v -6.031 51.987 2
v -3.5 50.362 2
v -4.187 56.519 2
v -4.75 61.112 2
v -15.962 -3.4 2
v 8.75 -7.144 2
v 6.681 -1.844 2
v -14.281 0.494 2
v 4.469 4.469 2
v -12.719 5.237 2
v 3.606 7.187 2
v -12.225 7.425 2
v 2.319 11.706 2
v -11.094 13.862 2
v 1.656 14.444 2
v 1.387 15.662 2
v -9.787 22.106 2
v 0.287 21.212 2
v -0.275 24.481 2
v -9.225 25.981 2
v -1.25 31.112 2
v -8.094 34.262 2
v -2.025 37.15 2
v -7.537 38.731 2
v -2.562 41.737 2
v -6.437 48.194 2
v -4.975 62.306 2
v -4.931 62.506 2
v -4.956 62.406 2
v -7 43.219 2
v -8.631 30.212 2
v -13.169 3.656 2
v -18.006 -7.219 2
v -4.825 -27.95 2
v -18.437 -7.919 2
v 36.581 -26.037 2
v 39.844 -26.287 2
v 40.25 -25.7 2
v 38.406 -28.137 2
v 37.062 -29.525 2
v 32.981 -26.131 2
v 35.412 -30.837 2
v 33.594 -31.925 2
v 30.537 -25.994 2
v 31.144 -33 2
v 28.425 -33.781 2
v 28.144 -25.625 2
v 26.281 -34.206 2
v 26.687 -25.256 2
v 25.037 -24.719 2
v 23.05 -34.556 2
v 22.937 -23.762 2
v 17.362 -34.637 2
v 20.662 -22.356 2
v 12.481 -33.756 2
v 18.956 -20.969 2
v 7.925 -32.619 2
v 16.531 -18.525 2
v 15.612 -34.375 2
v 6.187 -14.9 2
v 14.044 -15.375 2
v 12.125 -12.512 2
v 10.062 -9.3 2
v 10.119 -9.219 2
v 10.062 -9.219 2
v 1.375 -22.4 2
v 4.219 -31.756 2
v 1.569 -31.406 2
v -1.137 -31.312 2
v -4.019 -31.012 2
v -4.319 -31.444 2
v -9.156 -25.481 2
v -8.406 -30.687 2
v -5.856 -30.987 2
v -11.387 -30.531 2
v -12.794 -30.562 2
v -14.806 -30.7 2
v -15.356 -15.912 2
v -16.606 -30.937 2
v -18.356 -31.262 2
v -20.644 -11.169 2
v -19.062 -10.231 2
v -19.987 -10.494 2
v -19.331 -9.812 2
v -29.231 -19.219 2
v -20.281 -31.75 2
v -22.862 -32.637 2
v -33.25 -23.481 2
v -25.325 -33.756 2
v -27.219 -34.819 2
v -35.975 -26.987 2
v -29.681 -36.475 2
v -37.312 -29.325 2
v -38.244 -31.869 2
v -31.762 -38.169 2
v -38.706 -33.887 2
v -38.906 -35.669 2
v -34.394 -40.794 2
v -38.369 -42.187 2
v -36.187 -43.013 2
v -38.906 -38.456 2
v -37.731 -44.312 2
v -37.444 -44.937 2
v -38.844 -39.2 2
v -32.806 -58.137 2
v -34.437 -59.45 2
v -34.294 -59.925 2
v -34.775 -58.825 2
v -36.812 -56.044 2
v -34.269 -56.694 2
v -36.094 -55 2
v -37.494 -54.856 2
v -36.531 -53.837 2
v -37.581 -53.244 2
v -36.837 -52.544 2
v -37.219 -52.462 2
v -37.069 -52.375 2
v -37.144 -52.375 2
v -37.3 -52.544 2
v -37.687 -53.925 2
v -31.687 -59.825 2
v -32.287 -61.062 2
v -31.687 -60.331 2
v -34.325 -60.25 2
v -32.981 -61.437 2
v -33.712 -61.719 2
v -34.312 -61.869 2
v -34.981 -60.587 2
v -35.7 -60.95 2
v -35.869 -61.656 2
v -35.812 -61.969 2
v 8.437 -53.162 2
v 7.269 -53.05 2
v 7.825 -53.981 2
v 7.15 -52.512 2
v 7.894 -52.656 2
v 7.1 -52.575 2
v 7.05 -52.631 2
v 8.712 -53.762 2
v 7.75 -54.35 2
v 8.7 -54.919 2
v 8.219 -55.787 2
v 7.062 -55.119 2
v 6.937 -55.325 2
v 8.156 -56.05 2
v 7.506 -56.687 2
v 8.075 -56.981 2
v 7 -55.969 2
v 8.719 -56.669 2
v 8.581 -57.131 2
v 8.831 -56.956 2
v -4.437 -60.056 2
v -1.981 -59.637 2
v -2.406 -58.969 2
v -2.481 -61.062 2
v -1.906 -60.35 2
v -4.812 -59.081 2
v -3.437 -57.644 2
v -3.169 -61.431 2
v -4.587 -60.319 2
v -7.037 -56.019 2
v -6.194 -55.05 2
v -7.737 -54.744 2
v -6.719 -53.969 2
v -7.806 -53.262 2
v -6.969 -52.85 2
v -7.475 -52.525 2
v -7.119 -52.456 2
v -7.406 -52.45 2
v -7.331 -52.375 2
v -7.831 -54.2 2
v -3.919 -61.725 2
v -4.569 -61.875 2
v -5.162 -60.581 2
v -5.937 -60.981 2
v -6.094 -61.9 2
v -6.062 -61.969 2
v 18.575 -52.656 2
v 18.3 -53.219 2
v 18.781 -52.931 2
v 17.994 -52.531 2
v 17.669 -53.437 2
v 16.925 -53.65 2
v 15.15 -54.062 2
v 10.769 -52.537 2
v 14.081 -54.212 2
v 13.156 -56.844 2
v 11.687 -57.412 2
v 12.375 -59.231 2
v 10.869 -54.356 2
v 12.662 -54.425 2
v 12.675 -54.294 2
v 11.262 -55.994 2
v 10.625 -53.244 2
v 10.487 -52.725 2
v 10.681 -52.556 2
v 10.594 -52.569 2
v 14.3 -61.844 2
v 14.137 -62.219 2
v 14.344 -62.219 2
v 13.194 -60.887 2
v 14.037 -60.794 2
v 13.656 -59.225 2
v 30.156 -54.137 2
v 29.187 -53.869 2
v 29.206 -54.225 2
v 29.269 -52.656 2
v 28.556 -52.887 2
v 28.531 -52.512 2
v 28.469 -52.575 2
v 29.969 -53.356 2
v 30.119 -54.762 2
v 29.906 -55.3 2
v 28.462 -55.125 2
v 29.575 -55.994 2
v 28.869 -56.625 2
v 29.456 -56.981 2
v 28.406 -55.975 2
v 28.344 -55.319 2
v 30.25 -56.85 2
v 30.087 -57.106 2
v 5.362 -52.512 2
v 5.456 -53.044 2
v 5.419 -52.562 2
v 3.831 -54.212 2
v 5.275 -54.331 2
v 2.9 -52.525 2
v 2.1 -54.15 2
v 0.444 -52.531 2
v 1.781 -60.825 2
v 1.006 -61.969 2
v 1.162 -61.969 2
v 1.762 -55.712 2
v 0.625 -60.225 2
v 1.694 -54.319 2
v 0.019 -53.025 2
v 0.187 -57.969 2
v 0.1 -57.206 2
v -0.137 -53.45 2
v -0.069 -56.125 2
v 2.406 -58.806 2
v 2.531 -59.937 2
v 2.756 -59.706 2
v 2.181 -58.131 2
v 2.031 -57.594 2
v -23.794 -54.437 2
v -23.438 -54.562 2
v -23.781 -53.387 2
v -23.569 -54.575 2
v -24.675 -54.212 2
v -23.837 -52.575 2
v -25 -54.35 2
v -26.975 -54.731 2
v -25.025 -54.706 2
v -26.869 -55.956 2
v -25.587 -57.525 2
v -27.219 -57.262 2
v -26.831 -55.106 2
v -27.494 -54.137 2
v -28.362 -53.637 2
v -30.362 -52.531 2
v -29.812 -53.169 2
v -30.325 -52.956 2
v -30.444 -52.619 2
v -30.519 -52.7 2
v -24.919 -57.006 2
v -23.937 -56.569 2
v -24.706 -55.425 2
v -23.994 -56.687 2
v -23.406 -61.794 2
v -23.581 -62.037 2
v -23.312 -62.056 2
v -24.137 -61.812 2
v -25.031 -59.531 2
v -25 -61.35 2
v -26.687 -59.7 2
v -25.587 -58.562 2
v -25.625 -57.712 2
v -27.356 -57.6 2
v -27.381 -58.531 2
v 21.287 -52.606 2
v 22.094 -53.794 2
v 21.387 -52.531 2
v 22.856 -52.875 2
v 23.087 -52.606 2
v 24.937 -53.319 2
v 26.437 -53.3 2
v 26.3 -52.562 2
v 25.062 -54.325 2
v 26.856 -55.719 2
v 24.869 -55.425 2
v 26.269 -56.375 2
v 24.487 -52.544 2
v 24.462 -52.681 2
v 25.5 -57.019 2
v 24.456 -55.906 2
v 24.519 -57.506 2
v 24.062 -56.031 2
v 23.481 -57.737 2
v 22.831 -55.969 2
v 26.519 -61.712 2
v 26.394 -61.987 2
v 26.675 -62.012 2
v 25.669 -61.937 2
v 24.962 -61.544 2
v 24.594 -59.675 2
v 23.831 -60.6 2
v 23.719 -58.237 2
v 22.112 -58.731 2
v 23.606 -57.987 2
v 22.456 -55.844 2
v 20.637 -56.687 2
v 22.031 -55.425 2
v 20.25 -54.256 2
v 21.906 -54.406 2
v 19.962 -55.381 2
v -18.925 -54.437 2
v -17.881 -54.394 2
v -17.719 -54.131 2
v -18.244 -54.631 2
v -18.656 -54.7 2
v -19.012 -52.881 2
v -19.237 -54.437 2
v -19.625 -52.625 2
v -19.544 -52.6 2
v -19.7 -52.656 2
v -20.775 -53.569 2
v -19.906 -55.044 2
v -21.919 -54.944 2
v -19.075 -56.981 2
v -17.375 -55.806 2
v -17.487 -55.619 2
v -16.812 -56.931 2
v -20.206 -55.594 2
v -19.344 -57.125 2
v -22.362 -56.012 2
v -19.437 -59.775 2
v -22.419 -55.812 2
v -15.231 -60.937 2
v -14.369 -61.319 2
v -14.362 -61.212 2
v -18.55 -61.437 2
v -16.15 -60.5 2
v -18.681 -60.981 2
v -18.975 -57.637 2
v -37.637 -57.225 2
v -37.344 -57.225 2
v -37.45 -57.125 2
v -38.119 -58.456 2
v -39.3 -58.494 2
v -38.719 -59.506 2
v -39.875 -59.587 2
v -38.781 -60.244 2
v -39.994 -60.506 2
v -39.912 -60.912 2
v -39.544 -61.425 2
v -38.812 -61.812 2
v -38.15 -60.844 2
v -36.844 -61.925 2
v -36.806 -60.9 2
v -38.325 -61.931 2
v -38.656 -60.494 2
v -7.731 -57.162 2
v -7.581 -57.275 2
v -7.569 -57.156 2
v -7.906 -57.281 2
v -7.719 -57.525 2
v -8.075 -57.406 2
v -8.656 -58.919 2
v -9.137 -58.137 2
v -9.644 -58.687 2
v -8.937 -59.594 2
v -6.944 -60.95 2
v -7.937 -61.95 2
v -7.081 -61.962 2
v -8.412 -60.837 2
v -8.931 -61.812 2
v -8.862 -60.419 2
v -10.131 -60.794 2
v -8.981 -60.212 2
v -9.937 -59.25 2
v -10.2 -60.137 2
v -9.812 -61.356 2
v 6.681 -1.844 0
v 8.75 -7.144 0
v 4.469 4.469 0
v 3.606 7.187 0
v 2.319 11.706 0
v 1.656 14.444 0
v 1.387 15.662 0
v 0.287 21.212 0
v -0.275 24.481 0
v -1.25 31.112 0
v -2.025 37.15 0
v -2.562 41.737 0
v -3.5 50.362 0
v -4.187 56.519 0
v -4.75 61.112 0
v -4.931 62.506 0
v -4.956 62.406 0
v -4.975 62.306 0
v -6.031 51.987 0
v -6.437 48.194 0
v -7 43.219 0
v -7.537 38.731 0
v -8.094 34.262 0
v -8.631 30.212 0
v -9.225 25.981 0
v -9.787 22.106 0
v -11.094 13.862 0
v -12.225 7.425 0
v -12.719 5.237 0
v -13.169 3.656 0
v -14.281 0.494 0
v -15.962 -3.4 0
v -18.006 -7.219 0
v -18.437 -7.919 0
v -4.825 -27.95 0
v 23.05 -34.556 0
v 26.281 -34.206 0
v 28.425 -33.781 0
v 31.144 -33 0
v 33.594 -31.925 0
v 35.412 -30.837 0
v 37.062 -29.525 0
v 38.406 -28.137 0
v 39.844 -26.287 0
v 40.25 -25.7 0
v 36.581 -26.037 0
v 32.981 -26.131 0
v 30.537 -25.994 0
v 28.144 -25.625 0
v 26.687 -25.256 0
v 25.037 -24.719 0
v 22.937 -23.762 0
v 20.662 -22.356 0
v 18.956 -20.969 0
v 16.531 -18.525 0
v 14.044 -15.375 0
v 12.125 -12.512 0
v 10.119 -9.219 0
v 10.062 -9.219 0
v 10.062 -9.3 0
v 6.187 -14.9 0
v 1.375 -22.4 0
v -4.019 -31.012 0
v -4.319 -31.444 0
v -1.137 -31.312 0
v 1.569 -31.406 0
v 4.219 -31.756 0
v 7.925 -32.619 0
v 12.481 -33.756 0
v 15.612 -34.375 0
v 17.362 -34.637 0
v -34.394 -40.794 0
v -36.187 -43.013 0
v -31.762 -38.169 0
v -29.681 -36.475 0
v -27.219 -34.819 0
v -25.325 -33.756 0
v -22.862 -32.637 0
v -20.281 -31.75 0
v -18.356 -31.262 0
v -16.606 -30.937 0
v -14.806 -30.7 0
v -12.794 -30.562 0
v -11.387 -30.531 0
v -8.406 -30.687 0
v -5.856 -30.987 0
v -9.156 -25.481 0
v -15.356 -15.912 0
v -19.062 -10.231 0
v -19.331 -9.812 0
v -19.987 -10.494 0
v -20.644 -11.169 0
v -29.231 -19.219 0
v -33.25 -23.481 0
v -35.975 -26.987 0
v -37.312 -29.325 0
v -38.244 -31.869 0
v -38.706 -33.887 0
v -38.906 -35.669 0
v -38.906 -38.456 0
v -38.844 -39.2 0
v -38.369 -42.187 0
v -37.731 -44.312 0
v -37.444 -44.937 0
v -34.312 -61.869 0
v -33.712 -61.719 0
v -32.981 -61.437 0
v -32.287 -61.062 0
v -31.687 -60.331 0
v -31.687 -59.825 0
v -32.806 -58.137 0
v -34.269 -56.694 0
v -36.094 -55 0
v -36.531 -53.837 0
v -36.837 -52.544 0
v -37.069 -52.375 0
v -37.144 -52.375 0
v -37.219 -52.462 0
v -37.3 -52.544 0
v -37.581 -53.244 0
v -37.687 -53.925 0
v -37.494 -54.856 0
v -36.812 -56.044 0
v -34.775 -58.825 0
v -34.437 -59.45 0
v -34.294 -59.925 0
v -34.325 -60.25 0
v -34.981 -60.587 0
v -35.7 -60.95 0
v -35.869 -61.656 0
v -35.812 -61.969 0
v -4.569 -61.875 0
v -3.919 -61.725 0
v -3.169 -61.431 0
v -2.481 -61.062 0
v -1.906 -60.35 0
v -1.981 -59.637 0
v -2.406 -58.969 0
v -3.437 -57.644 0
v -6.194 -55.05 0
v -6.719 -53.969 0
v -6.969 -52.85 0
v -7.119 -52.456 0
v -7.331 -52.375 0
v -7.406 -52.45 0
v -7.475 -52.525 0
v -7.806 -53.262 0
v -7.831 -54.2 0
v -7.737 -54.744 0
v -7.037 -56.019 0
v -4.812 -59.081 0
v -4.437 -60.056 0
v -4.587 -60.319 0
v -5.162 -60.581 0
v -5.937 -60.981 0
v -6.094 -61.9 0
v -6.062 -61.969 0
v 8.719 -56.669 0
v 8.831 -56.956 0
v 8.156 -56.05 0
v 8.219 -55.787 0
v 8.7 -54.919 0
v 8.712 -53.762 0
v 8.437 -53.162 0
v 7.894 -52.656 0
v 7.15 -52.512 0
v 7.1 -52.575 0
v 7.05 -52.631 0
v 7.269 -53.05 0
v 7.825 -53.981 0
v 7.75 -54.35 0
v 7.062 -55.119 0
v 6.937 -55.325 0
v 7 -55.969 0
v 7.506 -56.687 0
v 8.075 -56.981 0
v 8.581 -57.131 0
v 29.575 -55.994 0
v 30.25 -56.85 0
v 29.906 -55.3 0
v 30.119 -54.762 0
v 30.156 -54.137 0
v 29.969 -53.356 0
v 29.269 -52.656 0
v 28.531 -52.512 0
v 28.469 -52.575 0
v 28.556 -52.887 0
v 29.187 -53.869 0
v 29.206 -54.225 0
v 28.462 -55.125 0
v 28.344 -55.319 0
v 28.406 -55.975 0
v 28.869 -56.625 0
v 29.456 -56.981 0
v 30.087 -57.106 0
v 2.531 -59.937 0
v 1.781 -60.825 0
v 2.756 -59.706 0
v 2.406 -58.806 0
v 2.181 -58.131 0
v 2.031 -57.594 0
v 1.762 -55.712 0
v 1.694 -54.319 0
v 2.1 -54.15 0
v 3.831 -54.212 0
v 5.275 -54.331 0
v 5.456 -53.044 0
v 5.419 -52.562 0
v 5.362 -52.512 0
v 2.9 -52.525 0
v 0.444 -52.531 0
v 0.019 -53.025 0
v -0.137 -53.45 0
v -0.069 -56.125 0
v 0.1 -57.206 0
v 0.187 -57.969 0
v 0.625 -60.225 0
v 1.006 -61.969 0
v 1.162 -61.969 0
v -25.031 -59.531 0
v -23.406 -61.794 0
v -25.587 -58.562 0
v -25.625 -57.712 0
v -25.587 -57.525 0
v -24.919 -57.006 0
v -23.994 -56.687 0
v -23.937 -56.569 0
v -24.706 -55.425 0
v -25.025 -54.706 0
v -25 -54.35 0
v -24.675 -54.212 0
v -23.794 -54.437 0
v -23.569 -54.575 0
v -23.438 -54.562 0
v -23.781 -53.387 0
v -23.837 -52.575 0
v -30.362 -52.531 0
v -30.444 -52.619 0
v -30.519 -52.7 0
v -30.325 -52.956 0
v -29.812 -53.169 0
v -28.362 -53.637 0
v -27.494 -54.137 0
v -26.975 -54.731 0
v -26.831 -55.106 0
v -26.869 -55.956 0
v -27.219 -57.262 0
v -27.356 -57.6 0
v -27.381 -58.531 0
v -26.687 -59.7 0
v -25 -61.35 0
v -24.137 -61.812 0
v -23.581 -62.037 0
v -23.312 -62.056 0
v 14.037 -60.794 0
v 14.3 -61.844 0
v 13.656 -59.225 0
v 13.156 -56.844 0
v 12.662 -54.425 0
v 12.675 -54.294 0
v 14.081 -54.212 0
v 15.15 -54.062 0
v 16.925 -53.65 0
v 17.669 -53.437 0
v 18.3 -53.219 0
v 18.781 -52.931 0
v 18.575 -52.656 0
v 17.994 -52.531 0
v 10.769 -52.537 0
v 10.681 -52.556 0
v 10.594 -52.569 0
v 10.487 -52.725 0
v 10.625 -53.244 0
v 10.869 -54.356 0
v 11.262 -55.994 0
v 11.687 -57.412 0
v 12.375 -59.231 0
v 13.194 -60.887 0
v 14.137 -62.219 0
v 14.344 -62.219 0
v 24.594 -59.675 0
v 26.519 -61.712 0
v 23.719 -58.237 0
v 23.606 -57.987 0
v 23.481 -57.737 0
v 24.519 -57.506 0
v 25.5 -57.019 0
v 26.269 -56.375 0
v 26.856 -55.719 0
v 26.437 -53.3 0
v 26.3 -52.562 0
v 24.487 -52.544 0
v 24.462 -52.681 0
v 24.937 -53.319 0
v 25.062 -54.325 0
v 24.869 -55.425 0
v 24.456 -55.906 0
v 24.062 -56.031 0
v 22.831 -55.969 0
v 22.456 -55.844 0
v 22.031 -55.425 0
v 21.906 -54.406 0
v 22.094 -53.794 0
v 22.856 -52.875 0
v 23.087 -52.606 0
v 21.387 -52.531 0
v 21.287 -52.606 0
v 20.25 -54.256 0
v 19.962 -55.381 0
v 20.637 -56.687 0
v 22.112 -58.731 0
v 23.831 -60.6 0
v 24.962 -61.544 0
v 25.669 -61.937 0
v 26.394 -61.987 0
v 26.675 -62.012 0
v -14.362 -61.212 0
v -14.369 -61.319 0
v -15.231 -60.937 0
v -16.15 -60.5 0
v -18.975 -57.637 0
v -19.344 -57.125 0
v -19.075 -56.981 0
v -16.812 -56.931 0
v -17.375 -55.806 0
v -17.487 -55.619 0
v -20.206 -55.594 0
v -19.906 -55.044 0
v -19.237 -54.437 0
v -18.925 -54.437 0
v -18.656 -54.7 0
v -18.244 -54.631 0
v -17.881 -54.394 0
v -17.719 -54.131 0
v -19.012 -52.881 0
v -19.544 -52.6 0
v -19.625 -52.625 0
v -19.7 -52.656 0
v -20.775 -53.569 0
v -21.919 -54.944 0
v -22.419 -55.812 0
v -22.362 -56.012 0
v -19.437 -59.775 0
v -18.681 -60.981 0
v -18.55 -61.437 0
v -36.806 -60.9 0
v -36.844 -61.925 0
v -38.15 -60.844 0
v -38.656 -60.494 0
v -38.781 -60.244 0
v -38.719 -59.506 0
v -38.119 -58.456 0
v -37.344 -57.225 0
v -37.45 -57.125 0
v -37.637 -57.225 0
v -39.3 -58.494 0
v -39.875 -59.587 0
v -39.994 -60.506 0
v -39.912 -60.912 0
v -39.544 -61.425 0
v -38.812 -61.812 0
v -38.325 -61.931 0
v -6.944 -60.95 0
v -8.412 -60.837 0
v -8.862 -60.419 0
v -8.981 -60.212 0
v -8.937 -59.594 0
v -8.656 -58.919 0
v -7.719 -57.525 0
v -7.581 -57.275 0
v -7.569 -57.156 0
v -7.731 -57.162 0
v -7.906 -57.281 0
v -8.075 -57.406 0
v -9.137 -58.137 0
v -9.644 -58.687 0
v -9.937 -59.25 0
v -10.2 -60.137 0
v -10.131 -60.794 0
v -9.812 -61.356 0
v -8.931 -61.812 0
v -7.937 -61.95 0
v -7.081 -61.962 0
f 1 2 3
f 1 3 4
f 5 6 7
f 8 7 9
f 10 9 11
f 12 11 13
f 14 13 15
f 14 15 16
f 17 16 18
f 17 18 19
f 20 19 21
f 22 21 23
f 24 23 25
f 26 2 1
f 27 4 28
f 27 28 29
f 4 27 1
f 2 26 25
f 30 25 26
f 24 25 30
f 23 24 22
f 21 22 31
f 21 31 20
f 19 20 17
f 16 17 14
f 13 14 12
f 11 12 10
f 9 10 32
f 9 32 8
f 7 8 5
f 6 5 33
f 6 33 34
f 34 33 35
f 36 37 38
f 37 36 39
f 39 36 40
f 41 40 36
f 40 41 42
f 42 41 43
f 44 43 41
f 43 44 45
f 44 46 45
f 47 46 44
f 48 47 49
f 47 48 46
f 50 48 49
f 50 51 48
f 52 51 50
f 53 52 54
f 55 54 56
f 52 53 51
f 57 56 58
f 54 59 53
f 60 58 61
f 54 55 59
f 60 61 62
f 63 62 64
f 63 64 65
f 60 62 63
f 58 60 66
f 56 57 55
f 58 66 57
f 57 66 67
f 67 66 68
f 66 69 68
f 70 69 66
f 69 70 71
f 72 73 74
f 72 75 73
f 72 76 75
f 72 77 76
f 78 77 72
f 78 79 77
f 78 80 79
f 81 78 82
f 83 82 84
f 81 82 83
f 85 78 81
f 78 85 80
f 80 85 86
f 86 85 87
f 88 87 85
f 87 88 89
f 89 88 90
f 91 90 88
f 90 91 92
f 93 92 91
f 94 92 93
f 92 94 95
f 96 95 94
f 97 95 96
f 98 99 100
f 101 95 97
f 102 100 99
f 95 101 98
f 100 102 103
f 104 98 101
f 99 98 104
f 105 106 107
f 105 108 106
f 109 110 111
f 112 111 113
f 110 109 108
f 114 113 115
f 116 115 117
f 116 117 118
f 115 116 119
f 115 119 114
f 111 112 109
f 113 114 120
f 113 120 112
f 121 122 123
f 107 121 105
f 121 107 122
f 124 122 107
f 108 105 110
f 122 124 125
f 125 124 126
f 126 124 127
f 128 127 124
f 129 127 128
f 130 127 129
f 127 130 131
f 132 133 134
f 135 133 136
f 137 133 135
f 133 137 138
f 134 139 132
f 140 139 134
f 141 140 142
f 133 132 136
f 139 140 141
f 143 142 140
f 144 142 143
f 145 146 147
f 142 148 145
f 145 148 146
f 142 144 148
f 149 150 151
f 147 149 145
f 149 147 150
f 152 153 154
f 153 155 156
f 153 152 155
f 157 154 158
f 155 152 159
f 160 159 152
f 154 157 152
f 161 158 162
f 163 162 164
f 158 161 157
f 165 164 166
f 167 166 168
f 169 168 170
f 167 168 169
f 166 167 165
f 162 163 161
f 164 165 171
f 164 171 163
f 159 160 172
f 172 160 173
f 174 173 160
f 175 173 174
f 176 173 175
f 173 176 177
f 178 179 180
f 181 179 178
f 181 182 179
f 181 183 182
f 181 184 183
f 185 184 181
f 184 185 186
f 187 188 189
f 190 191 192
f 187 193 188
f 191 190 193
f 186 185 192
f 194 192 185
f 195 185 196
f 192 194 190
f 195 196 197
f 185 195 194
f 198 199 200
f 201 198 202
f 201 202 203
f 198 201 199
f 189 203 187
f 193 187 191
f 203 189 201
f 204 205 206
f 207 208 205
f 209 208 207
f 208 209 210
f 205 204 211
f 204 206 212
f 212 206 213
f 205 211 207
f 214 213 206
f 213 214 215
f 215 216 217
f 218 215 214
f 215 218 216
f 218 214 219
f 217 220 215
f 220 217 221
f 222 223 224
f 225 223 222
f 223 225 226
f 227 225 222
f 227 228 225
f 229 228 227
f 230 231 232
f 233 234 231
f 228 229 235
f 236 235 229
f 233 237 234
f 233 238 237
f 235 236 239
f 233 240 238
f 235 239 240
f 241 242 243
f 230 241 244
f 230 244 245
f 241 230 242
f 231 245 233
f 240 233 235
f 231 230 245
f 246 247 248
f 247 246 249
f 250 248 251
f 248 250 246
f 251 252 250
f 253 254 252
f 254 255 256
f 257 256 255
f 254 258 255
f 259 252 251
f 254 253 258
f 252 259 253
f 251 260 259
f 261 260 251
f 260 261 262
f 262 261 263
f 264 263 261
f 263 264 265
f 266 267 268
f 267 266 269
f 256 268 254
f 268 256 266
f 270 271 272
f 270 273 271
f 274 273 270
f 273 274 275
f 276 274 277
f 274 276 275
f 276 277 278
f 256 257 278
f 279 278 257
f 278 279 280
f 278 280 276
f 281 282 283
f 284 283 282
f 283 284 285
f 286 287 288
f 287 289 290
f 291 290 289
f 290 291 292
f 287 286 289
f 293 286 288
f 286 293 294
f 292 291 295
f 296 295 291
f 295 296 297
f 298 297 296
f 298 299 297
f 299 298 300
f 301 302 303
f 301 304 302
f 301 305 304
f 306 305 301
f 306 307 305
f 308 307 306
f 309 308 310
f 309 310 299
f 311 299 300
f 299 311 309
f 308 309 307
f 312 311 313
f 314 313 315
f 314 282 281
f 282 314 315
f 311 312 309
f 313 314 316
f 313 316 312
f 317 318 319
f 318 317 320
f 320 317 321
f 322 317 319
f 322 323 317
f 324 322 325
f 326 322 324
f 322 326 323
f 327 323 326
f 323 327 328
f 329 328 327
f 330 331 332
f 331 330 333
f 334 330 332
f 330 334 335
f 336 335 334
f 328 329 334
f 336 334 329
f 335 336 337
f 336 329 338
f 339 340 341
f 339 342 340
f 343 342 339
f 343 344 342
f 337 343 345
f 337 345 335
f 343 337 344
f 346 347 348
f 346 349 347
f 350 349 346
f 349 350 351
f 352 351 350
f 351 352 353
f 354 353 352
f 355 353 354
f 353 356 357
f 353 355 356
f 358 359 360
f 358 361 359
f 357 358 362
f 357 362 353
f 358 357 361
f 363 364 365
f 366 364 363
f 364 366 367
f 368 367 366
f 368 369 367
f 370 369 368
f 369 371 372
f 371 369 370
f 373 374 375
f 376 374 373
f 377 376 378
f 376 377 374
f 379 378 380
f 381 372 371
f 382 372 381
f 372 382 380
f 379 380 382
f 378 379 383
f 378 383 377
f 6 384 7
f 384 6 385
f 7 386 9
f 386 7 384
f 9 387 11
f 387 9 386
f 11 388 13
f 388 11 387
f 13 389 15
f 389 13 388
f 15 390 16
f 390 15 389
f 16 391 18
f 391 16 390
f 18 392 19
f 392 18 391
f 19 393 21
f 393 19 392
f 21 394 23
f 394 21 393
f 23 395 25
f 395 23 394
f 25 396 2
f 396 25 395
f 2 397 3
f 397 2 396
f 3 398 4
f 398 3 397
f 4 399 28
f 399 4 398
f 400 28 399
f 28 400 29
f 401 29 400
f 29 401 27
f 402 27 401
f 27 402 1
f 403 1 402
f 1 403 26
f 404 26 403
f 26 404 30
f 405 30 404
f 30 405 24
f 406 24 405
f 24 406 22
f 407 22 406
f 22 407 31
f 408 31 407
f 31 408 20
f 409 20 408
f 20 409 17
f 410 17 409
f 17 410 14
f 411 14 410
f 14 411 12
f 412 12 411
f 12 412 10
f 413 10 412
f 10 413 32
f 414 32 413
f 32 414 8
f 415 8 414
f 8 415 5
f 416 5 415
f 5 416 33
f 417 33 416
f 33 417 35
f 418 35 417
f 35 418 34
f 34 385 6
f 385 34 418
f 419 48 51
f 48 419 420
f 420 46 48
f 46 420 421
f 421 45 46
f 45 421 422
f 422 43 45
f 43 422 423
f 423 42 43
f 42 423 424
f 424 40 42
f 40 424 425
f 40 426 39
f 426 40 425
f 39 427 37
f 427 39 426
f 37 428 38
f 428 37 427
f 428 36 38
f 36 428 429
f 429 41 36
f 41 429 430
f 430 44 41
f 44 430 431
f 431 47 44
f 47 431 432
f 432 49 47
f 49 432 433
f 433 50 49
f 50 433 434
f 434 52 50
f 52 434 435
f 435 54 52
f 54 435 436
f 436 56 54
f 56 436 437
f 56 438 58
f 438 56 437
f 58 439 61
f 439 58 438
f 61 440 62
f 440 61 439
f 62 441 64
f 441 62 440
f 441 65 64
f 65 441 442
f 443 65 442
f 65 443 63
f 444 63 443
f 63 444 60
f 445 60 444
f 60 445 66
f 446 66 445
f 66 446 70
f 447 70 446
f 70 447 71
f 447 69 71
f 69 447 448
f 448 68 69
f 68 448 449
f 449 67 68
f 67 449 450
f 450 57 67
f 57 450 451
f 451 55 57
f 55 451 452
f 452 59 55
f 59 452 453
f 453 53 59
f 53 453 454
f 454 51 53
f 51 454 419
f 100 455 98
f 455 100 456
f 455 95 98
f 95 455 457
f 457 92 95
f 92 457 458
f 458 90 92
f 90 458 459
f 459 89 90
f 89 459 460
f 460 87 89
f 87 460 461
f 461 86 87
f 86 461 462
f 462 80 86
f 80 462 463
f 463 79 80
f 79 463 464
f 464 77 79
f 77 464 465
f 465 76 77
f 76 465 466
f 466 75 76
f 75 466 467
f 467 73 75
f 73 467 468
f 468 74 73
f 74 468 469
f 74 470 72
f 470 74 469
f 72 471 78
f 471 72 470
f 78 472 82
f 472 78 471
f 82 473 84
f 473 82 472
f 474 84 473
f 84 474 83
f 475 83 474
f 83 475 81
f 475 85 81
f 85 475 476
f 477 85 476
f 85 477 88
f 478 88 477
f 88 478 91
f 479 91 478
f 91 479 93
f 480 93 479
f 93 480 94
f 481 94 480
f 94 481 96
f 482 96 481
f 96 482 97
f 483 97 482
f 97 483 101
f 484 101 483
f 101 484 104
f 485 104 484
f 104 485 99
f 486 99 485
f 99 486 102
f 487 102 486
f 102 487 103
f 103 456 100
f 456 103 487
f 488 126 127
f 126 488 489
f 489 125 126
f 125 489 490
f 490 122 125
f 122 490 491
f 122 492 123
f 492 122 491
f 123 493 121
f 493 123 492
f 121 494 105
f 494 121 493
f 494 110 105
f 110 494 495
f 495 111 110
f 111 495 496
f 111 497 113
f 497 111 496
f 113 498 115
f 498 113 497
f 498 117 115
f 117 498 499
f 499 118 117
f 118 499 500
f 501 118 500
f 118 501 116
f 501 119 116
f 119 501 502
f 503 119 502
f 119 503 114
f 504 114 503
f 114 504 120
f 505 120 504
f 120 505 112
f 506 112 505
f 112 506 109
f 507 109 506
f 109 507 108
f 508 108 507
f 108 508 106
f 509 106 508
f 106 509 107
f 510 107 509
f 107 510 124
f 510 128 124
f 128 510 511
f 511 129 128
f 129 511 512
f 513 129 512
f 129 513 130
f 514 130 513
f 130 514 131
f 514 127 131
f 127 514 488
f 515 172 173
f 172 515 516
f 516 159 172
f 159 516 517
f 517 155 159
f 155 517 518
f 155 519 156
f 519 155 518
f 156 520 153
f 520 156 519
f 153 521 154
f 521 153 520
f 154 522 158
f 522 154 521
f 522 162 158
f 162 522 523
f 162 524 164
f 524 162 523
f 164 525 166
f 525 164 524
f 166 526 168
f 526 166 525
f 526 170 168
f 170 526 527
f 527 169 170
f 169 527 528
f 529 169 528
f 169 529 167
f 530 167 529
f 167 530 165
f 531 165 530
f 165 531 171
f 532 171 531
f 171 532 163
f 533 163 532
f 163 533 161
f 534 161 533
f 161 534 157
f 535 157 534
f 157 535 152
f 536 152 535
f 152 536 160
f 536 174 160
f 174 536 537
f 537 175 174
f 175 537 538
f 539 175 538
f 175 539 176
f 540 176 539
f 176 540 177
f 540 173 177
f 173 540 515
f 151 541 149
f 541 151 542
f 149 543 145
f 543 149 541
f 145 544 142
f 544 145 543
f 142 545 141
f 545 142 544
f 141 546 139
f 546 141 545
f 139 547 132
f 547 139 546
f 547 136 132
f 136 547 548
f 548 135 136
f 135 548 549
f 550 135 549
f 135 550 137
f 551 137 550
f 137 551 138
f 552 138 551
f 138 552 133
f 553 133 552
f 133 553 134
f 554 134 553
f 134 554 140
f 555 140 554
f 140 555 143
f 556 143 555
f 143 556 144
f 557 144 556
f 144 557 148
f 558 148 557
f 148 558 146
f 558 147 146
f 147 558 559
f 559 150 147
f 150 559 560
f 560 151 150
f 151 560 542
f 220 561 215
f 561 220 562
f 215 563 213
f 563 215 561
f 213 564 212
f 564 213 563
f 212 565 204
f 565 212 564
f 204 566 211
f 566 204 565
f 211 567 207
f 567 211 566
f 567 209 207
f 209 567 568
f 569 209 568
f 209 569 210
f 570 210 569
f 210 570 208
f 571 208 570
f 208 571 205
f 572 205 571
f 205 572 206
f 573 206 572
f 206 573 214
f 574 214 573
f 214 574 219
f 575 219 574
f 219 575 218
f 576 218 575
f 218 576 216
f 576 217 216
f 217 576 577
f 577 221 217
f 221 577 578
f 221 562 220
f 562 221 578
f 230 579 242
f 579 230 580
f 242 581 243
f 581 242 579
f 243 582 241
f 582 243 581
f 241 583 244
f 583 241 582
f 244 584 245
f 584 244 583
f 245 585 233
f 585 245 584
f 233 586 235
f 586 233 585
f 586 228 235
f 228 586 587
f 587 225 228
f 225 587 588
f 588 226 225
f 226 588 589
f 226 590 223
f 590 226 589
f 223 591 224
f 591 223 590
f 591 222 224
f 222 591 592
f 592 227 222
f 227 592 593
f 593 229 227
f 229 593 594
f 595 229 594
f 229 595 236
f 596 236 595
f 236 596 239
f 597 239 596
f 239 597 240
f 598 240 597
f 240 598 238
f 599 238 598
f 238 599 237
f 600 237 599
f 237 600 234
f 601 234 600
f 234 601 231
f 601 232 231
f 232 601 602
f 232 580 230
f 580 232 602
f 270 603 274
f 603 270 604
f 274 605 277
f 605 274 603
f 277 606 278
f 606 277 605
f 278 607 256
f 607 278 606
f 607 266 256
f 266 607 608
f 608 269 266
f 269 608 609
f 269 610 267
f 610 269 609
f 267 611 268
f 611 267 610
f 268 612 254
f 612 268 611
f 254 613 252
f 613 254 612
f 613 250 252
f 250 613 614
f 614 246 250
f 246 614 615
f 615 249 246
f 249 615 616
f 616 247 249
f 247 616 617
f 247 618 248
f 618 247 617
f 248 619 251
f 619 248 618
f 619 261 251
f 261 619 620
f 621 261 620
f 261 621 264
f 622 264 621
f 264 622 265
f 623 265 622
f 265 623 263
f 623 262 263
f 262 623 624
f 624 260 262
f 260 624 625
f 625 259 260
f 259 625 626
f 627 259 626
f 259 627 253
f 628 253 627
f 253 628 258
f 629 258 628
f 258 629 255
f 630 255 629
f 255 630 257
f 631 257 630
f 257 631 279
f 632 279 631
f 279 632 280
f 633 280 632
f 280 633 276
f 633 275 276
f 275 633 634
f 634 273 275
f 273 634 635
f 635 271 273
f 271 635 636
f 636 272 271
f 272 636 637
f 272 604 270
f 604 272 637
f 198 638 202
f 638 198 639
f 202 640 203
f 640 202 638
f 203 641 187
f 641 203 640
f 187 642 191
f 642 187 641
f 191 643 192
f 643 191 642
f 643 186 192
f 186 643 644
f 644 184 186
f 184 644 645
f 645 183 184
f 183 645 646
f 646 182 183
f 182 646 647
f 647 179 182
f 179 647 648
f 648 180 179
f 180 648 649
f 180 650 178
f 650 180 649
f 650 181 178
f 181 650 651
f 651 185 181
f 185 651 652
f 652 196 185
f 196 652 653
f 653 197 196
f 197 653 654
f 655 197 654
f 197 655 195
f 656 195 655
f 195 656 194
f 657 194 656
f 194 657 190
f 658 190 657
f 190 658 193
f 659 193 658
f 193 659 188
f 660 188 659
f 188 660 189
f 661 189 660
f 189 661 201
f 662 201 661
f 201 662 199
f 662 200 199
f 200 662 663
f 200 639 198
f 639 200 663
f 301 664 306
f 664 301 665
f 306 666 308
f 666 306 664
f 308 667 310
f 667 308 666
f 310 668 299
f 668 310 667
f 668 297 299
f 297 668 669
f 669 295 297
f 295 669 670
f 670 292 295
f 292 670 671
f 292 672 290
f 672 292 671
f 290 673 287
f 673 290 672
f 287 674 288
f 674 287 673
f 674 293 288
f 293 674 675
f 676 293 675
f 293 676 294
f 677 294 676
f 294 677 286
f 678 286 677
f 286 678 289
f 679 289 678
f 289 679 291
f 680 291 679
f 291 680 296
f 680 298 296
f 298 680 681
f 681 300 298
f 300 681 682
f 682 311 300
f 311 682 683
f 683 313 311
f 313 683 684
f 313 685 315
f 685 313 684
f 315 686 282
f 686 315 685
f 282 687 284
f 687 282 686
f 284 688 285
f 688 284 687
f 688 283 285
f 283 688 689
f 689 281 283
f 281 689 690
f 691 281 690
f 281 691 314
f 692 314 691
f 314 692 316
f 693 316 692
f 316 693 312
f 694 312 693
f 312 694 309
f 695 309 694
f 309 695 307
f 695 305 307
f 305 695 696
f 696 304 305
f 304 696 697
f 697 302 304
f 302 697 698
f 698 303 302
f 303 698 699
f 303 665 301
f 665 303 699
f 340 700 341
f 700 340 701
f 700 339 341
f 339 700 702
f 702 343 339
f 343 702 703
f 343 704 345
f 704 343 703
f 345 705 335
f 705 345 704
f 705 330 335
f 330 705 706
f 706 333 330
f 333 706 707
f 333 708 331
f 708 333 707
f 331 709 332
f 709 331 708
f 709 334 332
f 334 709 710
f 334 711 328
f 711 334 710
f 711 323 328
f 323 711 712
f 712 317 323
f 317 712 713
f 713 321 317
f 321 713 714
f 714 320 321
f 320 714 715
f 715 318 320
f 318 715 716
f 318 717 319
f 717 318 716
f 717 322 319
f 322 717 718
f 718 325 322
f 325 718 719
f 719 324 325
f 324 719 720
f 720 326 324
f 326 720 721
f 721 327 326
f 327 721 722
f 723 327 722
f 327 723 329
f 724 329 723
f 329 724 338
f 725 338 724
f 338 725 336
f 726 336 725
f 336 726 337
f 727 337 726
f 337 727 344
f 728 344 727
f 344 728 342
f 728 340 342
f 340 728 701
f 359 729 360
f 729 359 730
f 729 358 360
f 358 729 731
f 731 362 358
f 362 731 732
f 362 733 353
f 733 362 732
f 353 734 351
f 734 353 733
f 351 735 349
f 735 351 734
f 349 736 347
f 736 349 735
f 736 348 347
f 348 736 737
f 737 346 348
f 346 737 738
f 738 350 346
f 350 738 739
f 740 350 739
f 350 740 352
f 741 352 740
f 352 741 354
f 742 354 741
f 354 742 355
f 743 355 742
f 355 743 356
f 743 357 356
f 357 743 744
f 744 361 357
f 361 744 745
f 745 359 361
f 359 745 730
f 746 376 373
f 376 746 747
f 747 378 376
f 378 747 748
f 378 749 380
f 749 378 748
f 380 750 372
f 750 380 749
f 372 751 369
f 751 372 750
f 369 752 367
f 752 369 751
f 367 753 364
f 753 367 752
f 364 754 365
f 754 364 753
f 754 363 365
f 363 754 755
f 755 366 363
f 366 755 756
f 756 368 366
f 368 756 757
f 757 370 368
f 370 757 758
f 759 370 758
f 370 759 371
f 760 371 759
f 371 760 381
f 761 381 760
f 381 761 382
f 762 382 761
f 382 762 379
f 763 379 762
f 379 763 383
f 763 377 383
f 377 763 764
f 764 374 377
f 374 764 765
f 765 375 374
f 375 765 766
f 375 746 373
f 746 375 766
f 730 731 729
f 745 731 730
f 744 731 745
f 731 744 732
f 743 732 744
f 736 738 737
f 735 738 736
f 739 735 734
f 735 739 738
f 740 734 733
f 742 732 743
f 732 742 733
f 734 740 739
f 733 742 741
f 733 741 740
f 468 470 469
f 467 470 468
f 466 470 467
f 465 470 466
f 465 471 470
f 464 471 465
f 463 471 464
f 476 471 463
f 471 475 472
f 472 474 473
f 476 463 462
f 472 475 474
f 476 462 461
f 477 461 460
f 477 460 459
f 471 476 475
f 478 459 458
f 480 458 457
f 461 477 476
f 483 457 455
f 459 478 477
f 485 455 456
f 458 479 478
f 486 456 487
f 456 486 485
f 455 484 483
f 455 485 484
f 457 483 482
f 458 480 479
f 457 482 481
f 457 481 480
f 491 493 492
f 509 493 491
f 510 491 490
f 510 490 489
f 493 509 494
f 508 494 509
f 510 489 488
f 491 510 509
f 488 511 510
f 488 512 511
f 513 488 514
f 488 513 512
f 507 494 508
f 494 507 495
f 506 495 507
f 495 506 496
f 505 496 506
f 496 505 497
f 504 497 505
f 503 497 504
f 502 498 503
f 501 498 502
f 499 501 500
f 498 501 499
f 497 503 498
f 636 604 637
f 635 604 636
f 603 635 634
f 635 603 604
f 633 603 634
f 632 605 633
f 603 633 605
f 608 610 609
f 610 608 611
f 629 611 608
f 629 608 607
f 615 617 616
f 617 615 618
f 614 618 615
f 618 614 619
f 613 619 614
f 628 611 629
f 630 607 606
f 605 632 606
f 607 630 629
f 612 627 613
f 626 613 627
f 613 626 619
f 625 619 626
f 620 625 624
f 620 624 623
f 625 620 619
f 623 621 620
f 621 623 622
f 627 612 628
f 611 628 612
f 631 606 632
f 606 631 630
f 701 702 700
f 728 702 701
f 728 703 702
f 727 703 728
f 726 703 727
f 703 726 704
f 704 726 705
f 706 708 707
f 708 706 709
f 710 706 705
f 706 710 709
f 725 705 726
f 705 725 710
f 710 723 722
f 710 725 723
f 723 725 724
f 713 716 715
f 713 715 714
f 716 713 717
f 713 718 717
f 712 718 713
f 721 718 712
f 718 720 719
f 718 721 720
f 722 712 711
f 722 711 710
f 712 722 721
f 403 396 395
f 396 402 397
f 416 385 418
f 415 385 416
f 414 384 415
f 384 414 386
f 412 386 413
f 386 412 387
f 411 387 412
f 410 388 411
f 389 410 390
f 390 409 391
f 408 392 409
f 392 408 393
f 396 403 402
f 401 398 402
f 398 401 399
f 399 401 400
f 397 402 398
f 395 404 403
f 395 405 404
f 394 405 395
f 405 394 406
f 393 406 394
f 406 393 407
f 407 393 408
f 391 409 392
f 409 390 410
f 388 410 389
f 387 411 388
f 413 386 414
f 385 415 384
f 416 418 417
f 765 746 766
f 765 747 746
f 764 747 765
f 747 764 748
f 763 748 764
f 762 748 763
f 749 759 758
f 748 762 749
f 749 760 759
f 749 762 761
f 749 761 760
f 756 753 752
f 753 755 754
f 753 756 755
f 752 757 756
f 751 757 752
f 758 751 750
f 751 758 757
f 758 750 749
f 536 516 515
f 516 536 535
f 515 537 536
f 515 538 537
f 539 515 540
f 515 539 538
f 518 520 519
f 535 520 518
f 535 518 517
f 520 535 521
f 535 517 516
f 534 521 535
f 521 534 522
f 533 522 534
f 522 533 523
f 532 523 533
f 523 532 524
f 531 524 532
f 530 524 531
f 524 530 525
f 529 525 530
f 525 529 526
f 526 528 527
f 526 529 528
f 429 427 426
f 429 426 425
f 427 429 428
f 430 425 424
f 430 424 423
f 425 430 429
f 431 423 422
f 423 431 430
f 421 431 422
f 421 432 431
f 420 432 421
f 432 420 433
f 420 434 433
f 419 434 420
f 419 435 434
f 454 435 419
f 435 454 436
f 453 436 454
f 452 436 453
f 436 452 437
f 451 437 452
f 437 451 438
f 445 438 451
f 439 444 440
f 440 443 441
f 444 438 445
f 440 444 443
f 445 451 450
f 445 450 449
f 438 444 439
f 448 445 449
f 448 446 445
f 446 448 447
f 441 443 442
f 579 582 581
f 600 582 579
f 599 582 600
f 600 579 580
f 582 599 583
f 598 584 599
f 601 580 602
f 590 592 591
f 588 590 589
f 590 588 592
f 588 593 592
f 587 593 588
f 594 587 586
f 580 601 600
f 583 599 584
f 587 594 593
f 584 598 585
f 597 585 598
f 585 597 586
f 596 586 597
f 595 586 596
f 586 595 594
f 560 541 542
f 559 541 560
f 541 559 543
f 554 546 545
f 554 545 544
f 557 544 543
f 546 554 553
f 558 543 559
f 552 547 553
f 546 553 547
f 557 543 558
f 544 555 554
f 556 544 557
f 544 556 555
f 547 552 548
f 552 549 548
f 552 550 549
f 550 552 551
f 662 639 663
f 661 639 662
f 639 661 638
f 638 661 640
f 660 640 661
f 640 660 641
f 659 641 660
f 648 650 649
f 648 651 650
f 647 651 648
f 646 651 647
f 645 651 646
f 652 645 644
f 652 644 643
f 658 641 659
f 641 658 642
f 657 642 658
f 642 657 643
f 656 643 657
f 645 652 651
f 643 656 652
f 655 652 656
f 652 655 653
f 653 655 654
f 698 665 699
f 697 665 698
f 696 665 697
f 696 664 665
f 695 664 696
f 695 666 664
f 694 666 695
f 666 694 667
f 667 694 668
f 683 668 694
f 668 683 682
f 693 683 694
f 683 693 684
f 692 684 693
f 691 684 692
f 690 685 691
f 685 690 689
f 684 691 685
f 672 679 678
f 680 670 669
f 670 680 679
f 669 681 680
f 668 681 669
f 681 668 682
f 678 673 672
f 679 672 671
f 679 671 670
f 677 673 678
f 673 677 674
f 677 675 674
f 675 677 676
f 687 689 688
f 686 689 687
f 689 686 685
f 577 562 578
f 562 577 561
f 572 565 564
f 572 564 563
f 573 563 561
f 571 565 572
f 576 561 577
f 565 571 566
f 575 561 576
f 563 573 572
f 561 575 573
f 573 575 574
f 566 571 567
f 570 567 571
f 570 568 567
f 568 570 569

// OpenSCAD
module 9d0bb59be97b0426153f66ea62081c4b_1()
{
 /* Generated by trace2scad version 20150415
    http://aggregate.org/MAKE/TRACE2SCAD/
    Optimized model has 387/4796 original points
 */
 color([0.48, 0.48, 0.48])
 assign(minx=0) /* polygon minx=39 */
 assign(miny=0) /* polygon miny=45 */
 assign(maxx=12880) /* polygon maxx=12880 */
 assign(maxy=20000) /* polygon maxy=20001 */
 assign(dx=maxx-minx)
 assign(dy=maxy-miny)
 assign(maxd=((dx>dy)?dx:dy))
 scale([1/maxd, 1/maxd, 1])
 translate([-minx-dx/2, -miny-dy/2, 0])
 linear_extrude(height=1, convexity=387)
 union() {
  union() {
   polygon([[5647,19985],[5644,19969],[5475,18318],[5410,17711],[5320,16915],[5234,16197],[5145,15482],[5059,14834],[4964,14157],[4874,13537],[4665,12218],[4484,11188],[4405,10838],[4333,10585],[4155,10079],[3886,9456],[3559,8845],[3490,8733],[5668,5528],[7840,8857],[7509,9705],[7155,10715],[7017,11150],[6811,11873],[6705,12311],[6662,12506],[6486,13394],[6396,13917],[6240,14978],[6116,15944],[6030,16678],[5880,18058],[5770,19043],[5680,19778],[5651,20001]], convexity=6);
   polygon([[8050,8518],[8050,8512],[7430,7616],[6660,6416],[5797,5038],[5749,4969],[6258,4990],[6691,4975],[7115,4919],[7708,4781],[8437,4599],[8938,4500],[9218,4458],[10128,4471],[10645,4527],[10988,4595],[11423,4720],[11815,4892],[12106,5066],[12370,5276],[12585,5498],[12815,5794],[12880,5888],[12293,5834],[11717,5819],[11326,5841],[10943,5900],[10710,5959],[10446,6045],[10110,6198],[9746,6423],[9473,6645],[9085,7036],[8687,7540],[8380,7998],[8059,8525],[8050,8525]], convexity=9);
   polygon([[3242,8321],[3137,8213],[1763,6925],[1120,6243],[684,5682],[470,5308],[321,4901],[247,4578],[215,4293],[215,3847],[225,3728],[301,3250],[403,2910],[449,2810],[650,3118],[937,3473],[1358,3893],[1691,4164],[2085,4429],[2388,4599],[2782,4778],[3195,4920],[3503,4998],[3783,5050],[4071,5088],[4393,5110],[4618,5115],[5095,5090],[5503,5042],[4975,5923],[3983,7454],[3390,8363],[3347,8430]], convexity=7);
   polygon([[485,1606],[472,1593],[427,1481],[410,1372],[441,1223],[550,1033],[876,588],[930,488],[953,412],[948,360],[843,306],[728,248],[701,135],[710,85],[950,101],[1046,125],[1163,170],[1274,230],[1370,347],[1370,428],[1191,698],[957,929],[665,1200],[595,1386],[546,1593],[509,1620],[497,1620]], convexity=8);
   polygon([[5255,1608],[5244,1596],[5191,1478],[5187,1328],[5202,1241],[5314,1037],[5670,547],[5730,391],[5706,349],[5614,307],[5490,243],[5465,96],[5470,85],[5709,100],[5813,124],[5933,171],[6043,230],[6135,344],[6123,458],[6055,565],[5890,777],[5449,1192],[5365,1365],[5325,1544],[5301,1607],[5267,1620]], convexity=8);
   polygon([[6904,1596],[6511,1595],[6443,1516],[6418,1448],[6429,1020],[6456,847],[6470,725],[6540,364],[6601,85],[6626,85],[6725,268],[6845,410],[6881,447],[6825,591],[6789,699],[6765,785],[6722,1086],[6711,1309],[6776,1336],[7053,1326],[7284,1307],[7313,1513],[7307,1590],[7298,1598]], convexity=10);
   polygon([[7576,1588],[7568,1579],[7603,1512],[7692,1363],[7680,1304],[7570,1181],[7550,1148],[7560,1045],[7641,930],[7732,883],[7813,859],[7853,887],[7835,933],[7745,1032],[7755,1074],[7832,1213],[7834,1398],[7790,1494],[7703,1575],[7584,1598]], convexity=10);
   polygon([[11000,1593],[10995,1588],[11009,1538],[11110,1381],[11113,1324],[10994,1180],[10975,1149],[10985,1044],[11059,940],[11153,883],[11254,863],[11280,904],[11172,1041],[11225,1152],[11259,1238],[11265,1338],[11235,1463],[11123,1575],[11005,1598]], convexity=10);
   polygon([[1569,1581],[1557,1568],[1588,1527],[1670,1493],[1902,1418],[2041,1338],[2124,1243],[2147,1183],[2141,1047],[2085,838],[2063,784],[2059,635],[2170,448],[2440,184],[2578,110],[2667,74],[2710,71],[2695,113],[2435,475],[2346,630],[2340,766],[2346,796],[2453,879],[2601,930],[2610,949],[2487,1132],[2436,1247],[2440,1304],[2492,1326],[2633,1290],[2669,1268],[2690,1270],[2635,1458],[2626,1588],[1582,1595]], convexity=13);
   polygon([[8149,1591],[8135,1589],[8118,1564],[8140,1481],[8179,1303],[8242,1041],[8310,814],[8420,523],[8551,258],[8702,45],[8735,45],[8728,105],[8686,273],[8625,524],[8545,905],[8466,1292],[8468,1313],[8693,1326],[8864,1350],[9148,1416],[9267,1450],[9368,1485],[9445,1531],[9412,1575],[9319,1595],[8163,1594]], convexity=9);
   polygon([[9854,1589],[9846,1583],[9680,1319],[9634,1139],[9742,930],[9978,603],[10253,304],[10434,153],[10547,90],[10663,82],[10708,78],[10683,126],[10375,452],[10235,682],[10217,722],[10197,762],[10363,799],[10520,877],[10643,980],[10737,1085],[10670,1472],[10648,1590],[10358,1593],[10354,1571],[10430,1469],[10450,1308],[10419,1132],[10353,1055],[10290,1035],[10093,1045],[10033,1065],[9965,1132],[9945,1295],[9975,1393],[10097,1540],[10134,1583],[9862,1595]], convexity=13);
   polygon([[3300,1580],[3288,1575],[3116,1429],[2933,1209],[2853,1070],[2862,1038],[3330,436],[3451,243],[3472,170],[4141,189],[4142,206],[4003,250],[3856,320],[3404,778],[3345,860],[3388,883],[3750,891],[3660,1071],[3642,1101],[3207,1105],[3255,1193],[3362,1290],[3412,1290],[3455,1248],[3521,1259],[3579,1297],[3605,1339],[3398,1539],[3313,1584]], convexity=12);
   polygon([[433,852],[418,844],[152,641],[60,466],[41,319],[54,254],[113,172],[230,110],[308,91],[545,92],[551,256],[336,265],[255,321],[235,361],[245,479],[341,647],[465,844],[448,860]], convexity=8);
   polygon([[5175,835],[5148,815],[4978,698],[4897,610],[4850,520],[4808,378],[4819,273],[4870,183],[5011,110],[5170,88],[5307,86],[5329,248],[5094,266],[5022,333],[5003,366],[5010,465],[5055,573],[5205,796],[5227,836],[5229,855],[5203,854]], convexity=8);
  }
 }
}

module 9d0bb59be97b0426153f66ea62081c4b()
{
 /* all layers combined, scaled to within a 1mm cube */
 scale([1, 1, 1/1])
 difference() {
  union() {
   scale([1,1,2]) translate([0,0,-0.5]) 9d0bb59be97b0426153f66ea62081c4b_1();
  }
  translate([0,0,-2]) cube([2,2,4],center=true);
 }
}

scale([125, 125, 2]) {
	9d0bb59be97b0426153f66ea62081c4b();
}
